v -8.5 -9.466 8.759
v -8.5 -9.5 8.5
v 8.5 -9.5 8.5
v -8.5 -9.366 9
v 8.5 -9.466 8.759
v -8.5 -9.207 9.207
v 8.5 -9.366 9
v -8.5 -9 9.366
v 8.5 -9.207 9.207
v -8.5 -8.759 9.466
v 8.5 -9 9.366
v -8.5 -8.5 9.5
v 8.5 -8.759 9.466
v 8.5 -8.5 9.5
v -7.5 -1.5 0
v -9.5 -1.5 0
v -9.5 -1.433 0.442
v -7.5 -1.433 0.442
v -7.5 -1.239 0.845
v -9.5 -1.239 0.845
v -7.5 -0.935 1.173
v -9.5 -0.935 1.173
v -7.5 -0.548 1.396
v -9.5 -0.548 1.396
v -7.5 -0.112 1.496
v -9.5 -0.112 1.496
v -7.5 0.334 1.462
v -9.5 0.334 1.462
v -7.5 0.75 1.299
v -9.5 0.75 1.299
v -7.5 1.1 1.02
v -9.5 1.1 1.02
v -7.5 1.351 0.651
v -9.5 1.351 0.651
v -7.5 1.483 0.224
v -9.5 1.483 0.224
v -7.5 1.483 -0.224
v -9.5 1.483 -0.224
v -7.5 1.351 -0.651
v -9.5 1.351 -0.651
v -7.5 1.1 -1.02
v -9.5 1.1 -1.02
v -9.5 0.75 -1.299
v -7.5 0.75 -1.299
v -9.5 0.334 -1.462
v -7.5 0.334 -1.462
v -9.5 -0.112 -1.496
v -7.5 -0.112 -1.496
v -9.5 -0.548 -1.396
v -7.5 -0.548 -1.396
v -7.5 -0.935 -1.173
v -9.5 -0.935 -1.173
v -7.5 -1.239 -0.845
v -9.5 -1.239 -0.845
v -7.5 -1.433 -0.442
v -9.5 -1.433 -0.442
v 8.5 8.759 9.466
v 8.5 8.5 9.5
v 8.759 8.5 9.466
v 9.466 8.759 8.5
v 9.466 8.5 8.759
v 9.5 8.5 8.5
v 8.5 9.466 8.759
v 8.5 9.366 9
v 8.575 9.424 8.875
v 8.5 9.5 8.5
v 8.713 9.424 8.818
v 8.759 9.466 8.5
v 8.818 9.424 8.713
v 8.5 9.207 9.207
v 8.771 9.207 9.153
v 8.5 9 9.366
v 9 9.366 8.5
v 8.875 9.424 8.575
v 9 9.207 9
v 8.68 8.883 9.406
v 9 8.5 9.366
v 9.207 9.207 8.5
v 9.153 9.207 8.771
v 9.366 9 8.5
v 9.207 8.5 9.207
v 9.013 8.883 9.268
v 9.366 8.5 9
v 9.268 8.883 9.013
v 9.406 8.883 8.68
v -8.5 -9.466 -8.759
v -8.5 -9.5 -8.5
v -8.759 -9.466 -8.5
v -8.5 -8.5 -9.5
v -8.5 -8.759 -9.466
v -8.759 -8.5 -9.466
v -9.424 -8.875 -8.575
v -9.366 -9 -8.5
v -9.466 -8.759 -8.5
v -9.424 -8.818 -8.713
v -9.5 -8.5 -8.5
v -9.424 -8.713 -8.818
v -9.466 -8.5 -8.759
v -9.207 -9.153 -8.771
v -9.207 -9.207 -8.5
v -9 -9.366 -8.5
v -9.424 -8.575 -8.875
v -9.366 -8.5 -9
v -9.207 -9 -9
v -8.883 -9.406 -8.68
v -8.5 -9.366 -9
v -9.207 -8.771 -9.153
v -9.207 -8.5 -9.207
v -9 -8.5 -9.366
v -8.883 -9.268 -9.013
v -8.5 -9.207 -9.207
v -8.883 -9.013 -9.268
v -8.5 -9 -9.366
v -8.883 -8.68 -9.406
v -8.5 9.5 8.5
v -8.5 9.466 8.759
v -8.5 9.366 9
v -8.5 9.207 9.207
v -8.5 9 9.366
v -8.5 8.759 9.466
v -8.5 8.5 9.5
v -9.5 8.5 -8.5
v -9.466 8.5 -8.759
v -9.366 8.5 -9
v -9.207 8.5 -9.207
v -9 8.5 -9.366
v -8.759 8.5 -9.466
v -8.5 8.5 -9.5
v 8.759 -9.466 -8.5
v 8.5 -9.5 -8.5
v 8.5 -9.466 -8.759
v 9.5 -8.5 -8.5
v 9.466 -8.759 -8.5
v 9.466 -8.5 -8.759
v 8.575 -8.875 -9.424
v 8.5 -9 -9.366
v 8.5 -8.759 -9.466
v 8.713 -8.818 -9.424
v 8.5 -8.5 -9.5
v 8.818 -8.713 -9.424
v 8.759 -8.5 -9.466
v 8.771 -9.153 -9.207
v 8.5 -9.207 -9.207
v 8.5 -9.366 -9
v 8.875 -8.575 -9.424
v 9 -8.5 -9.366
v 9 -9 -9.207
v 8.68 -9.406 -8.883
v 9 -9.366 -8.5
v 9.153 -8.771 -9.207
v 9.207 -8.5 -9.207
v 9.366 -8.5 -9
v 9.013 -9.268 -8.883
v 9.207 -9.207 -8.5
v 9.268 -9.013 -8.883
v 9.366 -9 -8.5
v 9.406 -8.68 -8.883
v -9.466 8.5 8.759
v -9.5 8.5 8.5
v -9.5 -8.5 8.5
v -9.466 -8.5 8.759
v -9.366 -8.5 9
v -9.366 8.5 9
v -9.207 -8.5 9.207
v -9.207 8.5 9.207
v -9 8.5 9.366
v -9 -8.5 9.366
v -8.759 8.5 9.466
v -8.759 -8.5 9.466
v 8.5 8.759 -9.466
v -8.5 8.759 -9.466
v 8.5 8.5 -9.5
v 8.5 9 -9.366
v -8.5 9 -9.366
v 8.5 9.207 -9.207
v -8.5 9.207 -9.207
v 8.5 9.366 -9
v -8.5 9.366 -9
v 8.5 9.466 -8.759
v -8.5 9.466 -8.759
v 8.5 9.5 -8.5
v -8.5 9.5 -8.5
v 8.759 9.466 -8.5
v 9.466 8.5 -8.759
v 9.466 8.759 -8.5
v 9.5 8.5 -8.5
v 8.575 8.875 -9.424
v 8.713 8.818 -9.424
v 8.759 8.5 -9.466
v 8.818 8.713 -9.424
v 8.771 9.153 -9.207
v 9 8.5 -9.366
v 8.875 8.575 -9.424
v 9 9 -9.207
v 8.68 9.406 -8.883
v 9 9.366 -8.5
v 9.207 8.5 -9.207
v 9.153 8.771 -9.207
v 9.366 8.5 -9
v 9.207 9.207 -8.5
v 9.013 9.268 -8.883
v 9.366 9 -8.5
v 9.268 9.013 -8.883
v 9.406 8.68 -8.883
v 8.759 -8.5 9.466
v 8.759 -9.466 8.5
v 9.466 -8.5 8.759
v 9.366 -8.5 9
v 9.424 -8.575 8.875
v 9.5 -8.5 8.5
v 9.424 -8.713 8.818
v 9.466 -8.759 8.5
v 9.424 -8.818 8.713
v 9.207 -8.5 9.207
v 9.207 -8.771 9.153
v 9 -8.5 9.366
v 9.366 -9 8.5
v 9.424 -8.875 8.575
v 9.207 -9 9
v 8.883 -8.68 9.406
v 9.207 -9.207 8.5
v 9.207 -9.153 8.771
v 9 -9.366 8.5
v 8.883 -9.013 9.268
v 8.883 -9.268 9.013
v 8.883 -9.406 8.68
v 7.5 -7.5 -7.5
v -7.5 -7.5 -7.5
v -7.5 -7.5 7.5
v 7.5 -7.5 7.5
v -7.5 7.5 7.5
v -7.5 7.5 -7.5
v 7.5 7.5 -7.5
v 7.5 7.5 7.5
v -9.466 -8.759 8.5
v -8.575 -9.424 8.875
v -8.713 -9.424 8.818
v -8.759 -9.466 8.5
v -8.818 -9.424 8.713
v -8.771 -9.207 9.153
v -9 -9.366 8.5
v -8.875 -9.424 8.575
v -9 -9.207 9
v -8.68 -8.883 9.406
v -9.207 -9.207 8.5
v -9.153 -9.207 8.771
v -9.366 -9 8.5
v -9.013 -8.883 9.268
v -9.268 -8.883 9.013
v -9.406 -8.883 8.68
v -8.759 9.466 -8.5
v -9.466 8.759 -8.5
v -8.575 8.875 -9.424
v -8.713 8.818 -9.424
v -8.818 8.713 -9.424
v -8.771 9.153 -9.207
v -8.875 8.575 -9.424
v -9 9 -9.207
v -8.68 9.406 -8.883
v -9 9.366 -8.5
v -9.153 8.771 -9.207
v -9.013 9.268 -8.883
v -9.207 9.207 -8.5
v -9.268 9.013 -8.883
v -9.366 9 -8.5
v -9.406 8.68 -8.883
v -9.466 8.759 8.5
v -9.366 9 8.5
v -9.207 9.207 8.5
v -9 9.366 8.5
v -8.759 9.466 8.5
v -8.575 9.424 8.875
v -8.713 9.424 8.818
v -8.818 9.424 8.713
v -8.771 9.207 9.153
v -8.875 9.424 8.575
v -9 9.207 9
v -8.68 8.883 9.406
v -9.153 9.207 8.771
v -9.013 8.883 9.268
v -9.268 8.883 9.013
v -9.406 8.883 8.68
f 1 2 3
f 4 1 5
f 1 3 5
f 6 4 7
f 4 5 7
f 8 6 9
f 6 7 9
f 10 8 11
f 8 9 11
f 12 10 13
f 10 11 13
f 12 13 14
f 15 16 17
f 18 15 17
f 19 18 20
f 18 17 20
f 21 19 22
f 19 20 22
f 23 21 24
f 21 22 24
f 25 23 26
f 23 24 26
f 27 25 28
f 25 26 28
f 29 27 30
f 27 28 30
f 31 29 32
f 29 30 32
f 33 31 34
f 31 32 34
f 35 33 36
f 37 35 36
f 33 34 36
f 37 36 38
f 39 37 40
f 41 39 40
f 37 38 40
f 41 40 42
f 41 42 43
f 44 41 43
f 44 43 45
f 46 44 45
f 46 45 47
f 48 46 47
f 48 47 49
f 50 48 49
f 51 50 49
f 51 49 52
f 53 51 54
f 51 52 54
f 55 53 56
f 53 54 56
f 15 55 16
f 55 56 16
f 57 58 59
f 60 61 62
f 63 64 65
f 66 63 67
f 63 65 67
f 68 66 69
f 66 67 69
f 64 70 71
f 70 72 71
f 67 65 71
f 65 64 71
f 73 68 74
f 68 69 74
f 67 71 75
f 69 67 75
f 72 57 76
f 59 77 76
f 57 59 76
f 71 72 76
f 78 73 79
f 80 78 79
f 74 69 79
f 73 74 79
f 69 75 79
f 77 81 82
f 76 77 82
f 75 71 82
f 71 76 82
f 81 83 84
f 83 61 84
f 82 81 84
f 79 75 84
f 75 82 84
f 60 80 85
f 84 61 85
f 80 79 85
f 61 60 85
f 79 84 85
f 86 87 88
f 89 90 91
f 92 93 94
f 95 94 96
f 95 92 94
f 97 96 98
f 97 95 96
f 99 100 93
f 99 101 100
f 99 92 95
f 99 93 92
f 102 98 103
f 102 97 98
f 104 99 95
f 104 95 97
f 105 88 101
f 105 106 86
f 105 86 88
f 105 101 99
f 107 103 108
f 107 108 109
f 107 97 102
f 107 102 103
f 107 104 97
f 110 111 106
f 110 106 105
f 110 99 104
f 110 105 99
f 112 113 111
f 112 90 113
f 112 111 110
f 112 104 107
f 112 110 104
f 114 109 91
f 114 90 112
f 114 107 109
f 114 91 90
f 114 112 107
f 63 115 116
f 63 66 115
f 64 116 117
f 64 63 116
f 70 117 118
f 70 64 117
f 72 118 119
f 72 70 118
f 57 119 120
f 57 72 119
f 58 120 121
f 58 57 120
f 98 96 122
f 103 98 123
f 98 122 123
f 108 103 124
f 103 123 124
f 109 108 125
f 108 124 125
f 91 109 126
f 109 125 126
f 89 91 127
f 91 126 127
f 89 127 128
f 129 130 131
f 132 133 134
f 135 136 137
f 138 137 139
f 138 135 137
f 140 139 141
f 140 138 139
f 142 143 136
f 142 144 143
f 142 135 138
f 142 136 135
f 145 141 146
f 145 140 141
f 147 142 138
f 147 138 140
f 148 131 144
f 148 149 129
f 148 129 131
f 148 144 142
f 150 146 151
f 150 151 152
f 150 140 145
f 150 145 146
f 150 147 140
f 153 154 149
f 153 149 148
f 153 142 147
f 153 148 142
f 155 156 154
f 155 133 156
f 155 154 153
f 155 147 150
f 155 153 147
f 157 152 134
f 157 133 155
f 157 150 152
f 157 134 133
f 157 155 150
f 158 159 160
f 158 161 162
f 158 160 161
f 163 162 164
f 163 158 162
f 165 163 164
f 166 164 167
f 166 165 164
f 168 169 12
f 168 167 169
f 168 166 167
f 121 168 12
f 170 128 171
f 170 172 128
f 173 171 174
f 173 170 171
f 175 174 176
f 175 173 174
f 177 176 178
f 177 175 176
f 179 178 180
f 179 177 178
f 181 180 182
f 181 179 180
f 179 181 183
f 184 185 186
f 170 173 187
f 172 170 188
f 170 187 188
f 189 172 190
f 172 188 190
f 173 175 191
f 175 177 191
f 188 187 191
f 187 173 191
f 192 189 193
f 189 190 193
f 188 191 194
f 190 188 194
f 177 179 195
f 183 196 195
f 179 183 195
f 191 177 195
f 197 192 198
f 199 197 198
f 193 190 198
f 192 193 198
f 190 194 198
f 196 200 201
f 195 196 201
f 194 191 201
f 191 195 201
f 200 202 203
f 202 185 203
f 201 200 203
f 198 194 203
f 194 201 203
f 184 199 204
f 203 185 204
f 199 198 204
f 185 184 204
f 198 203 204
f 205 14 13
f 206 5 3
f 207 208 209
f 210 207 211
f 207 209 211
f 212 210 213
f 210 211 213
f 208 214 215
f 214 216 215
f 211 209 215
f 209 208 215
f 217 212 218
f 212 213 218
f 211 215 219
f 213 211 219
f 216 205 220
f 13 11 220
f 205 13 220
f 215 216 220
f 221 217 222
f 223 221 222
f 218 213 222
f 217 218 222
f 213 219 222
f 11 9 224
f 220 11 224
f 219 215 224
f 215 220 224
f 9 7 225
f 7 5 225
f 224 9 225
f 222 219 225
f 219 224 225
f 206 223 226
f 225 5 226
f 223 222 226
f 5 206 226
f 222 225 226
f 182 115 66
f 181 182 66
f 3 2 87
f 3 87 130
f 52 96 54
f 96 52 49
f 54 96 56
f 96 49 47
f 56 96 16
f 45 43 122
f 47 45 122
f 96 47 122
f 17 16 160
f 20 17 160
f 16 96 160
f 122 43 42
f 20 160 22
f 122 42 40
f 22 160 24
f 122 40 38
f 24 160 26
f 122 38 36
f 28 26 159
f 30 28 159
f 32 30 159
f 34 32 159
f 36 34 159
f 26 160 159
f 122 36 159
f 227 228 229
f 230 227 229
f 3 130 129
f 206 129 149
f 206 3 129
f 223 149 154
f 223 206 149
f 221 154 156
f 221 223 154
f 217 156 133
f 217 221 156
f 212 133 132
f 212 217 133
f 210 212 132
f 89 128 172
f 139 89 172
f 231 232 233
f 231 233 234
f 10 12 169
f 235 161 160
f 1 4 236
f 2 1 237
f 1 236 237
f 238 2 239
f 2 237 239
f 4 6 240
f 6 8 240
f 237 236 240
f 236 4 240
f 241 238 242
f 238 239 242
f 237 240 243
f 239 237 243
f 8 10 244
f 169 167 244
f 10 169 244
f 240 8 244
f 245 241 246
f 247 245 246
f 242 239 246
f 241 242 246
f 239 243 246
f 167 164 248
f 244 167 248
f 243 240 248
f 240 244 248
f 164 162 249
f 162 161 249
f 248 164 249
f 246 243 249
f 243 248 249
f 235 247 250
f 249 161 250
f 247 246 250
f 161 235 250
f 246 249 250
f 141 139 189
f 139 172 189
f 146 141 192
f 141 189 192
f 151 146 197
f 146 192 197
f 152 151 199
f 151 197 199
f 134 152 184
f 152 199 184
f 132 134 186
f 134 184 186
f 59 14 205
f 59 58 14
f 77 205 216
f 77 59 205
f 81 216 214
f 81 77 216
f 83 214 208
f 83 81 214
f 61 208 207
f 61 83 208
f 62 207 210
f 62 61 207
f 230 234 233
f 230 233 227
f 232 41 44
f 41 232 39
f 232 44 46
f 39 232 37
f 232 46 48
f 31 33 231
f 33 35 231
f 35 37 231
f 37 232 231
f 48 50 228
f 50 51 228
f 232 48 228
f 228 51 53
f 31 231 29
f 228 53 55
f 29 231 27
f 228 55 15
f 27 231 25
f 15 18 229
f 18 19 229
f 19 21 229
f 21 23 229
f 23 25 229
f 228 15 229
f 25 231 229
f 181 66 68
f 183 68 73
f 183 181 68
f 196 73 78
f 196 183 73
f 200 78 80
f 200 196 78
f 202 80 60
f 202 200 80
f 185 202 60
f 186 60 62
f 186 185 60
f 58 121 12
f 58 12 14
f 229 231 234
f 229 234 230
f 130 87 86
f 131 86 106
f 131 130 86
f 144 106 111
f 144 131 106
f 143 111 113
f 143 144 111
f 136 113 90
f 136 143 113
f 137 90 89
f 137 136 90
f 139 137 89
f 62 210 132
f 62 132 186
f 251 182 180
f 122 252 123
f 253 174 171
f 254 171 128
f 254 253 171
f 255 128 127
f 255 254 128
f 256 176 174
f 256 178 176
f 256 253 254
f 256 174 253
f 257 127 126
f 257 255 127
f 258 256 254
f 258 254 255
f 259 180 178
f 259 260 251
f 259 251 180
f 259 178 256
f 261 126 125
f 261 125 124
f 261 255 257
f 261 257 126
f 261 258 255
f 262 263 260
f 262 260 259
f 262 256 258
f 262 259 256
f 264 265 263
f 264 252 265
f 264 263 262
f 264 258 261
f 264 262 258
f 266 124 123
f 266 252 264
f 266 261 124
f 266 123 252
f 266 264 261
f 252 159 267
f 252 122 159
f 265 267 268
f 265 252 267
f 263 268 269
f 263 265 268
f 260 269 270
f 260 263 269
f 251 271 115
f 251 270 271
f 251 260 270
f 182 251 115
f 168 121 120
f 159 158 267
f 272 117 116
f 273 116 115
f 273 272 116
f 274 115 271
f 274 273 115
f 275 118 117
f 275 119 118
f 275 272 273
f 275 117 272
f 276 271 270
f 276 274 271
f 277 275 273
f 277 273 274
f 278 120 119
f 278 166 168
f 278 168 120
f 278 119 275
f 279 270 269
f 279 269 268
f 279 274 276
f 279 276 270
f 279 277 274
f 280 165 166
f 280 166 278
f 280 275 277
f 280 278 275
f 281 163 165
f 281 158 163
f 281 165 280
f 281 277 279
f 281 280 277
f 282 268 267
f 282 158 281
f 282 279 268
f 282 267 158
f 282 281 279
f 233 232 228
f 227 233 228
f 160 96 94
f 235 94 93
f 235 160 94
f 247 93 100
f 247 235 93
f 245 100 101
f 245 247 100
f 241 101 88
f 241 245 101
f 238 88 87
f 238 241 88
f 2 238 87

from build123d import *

# Parameters (mm, degrees)
F0_W     = 19
F0_H     = 19
F1_DEPTH = 9.5
F3_START = -2
F2_W     = 15
F2_H     = 15
F3_DEPTH = 15
F5_R     = 1
F4_R     = 1.5
F6_DEPTH = 2


with BuildPart() as f1:
    # F0 (on Top) → F1 (new body, symmetric)
    with BuildSketch(Plane.XY):
        Rectangle(F0_W, F0_H)
    extrude(amount=F1_DEPTH, both=True)

    # F2 (on face) → F3 (cut)
    with BuildSketch(Plane(origin=(-9.5, 0, 0), x_dir=(0, -1, 0), z_dir=(-1, 0, 0)).offset(F3_START)):
        Rectangle(F2_W, F2_H)
    extrude(amount=-F3_DEPTH, mode=Mode.SUBTRACT)

    # F5
    f5_edges = [f1.edges().sort_by_distance(p)[0] for p in [
        (-9.5, 0, 9.5),
        (0, -9.5, 9.5),
        (9.5, 0, 9.5),
        (0, 9.5, 9.5),
        (-9.5, 9.5, 0),
        (9.5, 9.5, 0),
        (0, 9.5, -9.5),
        (9.5, -9.5, 0),
        (0, -9.5, -9.5),
        (9.5, 0, -9.5),
        (-9.5, -9.5, 0),
        (-9.5, 0, -9.5),
    ]]
    fillet(f5_edges, radius=F5_R)

    # F4 (on face) → F6 (cut)
    with BuildSketch(Plane(origin=(-9.5, 0, 0), x_dir=(0, -1, 0), z_dir=(-1, 0, 0))):
        Circle(F4_R)
    extrude(amount=-F6_DEPTH, mode=Mode.SUBTRACT)


solid = f1.part
